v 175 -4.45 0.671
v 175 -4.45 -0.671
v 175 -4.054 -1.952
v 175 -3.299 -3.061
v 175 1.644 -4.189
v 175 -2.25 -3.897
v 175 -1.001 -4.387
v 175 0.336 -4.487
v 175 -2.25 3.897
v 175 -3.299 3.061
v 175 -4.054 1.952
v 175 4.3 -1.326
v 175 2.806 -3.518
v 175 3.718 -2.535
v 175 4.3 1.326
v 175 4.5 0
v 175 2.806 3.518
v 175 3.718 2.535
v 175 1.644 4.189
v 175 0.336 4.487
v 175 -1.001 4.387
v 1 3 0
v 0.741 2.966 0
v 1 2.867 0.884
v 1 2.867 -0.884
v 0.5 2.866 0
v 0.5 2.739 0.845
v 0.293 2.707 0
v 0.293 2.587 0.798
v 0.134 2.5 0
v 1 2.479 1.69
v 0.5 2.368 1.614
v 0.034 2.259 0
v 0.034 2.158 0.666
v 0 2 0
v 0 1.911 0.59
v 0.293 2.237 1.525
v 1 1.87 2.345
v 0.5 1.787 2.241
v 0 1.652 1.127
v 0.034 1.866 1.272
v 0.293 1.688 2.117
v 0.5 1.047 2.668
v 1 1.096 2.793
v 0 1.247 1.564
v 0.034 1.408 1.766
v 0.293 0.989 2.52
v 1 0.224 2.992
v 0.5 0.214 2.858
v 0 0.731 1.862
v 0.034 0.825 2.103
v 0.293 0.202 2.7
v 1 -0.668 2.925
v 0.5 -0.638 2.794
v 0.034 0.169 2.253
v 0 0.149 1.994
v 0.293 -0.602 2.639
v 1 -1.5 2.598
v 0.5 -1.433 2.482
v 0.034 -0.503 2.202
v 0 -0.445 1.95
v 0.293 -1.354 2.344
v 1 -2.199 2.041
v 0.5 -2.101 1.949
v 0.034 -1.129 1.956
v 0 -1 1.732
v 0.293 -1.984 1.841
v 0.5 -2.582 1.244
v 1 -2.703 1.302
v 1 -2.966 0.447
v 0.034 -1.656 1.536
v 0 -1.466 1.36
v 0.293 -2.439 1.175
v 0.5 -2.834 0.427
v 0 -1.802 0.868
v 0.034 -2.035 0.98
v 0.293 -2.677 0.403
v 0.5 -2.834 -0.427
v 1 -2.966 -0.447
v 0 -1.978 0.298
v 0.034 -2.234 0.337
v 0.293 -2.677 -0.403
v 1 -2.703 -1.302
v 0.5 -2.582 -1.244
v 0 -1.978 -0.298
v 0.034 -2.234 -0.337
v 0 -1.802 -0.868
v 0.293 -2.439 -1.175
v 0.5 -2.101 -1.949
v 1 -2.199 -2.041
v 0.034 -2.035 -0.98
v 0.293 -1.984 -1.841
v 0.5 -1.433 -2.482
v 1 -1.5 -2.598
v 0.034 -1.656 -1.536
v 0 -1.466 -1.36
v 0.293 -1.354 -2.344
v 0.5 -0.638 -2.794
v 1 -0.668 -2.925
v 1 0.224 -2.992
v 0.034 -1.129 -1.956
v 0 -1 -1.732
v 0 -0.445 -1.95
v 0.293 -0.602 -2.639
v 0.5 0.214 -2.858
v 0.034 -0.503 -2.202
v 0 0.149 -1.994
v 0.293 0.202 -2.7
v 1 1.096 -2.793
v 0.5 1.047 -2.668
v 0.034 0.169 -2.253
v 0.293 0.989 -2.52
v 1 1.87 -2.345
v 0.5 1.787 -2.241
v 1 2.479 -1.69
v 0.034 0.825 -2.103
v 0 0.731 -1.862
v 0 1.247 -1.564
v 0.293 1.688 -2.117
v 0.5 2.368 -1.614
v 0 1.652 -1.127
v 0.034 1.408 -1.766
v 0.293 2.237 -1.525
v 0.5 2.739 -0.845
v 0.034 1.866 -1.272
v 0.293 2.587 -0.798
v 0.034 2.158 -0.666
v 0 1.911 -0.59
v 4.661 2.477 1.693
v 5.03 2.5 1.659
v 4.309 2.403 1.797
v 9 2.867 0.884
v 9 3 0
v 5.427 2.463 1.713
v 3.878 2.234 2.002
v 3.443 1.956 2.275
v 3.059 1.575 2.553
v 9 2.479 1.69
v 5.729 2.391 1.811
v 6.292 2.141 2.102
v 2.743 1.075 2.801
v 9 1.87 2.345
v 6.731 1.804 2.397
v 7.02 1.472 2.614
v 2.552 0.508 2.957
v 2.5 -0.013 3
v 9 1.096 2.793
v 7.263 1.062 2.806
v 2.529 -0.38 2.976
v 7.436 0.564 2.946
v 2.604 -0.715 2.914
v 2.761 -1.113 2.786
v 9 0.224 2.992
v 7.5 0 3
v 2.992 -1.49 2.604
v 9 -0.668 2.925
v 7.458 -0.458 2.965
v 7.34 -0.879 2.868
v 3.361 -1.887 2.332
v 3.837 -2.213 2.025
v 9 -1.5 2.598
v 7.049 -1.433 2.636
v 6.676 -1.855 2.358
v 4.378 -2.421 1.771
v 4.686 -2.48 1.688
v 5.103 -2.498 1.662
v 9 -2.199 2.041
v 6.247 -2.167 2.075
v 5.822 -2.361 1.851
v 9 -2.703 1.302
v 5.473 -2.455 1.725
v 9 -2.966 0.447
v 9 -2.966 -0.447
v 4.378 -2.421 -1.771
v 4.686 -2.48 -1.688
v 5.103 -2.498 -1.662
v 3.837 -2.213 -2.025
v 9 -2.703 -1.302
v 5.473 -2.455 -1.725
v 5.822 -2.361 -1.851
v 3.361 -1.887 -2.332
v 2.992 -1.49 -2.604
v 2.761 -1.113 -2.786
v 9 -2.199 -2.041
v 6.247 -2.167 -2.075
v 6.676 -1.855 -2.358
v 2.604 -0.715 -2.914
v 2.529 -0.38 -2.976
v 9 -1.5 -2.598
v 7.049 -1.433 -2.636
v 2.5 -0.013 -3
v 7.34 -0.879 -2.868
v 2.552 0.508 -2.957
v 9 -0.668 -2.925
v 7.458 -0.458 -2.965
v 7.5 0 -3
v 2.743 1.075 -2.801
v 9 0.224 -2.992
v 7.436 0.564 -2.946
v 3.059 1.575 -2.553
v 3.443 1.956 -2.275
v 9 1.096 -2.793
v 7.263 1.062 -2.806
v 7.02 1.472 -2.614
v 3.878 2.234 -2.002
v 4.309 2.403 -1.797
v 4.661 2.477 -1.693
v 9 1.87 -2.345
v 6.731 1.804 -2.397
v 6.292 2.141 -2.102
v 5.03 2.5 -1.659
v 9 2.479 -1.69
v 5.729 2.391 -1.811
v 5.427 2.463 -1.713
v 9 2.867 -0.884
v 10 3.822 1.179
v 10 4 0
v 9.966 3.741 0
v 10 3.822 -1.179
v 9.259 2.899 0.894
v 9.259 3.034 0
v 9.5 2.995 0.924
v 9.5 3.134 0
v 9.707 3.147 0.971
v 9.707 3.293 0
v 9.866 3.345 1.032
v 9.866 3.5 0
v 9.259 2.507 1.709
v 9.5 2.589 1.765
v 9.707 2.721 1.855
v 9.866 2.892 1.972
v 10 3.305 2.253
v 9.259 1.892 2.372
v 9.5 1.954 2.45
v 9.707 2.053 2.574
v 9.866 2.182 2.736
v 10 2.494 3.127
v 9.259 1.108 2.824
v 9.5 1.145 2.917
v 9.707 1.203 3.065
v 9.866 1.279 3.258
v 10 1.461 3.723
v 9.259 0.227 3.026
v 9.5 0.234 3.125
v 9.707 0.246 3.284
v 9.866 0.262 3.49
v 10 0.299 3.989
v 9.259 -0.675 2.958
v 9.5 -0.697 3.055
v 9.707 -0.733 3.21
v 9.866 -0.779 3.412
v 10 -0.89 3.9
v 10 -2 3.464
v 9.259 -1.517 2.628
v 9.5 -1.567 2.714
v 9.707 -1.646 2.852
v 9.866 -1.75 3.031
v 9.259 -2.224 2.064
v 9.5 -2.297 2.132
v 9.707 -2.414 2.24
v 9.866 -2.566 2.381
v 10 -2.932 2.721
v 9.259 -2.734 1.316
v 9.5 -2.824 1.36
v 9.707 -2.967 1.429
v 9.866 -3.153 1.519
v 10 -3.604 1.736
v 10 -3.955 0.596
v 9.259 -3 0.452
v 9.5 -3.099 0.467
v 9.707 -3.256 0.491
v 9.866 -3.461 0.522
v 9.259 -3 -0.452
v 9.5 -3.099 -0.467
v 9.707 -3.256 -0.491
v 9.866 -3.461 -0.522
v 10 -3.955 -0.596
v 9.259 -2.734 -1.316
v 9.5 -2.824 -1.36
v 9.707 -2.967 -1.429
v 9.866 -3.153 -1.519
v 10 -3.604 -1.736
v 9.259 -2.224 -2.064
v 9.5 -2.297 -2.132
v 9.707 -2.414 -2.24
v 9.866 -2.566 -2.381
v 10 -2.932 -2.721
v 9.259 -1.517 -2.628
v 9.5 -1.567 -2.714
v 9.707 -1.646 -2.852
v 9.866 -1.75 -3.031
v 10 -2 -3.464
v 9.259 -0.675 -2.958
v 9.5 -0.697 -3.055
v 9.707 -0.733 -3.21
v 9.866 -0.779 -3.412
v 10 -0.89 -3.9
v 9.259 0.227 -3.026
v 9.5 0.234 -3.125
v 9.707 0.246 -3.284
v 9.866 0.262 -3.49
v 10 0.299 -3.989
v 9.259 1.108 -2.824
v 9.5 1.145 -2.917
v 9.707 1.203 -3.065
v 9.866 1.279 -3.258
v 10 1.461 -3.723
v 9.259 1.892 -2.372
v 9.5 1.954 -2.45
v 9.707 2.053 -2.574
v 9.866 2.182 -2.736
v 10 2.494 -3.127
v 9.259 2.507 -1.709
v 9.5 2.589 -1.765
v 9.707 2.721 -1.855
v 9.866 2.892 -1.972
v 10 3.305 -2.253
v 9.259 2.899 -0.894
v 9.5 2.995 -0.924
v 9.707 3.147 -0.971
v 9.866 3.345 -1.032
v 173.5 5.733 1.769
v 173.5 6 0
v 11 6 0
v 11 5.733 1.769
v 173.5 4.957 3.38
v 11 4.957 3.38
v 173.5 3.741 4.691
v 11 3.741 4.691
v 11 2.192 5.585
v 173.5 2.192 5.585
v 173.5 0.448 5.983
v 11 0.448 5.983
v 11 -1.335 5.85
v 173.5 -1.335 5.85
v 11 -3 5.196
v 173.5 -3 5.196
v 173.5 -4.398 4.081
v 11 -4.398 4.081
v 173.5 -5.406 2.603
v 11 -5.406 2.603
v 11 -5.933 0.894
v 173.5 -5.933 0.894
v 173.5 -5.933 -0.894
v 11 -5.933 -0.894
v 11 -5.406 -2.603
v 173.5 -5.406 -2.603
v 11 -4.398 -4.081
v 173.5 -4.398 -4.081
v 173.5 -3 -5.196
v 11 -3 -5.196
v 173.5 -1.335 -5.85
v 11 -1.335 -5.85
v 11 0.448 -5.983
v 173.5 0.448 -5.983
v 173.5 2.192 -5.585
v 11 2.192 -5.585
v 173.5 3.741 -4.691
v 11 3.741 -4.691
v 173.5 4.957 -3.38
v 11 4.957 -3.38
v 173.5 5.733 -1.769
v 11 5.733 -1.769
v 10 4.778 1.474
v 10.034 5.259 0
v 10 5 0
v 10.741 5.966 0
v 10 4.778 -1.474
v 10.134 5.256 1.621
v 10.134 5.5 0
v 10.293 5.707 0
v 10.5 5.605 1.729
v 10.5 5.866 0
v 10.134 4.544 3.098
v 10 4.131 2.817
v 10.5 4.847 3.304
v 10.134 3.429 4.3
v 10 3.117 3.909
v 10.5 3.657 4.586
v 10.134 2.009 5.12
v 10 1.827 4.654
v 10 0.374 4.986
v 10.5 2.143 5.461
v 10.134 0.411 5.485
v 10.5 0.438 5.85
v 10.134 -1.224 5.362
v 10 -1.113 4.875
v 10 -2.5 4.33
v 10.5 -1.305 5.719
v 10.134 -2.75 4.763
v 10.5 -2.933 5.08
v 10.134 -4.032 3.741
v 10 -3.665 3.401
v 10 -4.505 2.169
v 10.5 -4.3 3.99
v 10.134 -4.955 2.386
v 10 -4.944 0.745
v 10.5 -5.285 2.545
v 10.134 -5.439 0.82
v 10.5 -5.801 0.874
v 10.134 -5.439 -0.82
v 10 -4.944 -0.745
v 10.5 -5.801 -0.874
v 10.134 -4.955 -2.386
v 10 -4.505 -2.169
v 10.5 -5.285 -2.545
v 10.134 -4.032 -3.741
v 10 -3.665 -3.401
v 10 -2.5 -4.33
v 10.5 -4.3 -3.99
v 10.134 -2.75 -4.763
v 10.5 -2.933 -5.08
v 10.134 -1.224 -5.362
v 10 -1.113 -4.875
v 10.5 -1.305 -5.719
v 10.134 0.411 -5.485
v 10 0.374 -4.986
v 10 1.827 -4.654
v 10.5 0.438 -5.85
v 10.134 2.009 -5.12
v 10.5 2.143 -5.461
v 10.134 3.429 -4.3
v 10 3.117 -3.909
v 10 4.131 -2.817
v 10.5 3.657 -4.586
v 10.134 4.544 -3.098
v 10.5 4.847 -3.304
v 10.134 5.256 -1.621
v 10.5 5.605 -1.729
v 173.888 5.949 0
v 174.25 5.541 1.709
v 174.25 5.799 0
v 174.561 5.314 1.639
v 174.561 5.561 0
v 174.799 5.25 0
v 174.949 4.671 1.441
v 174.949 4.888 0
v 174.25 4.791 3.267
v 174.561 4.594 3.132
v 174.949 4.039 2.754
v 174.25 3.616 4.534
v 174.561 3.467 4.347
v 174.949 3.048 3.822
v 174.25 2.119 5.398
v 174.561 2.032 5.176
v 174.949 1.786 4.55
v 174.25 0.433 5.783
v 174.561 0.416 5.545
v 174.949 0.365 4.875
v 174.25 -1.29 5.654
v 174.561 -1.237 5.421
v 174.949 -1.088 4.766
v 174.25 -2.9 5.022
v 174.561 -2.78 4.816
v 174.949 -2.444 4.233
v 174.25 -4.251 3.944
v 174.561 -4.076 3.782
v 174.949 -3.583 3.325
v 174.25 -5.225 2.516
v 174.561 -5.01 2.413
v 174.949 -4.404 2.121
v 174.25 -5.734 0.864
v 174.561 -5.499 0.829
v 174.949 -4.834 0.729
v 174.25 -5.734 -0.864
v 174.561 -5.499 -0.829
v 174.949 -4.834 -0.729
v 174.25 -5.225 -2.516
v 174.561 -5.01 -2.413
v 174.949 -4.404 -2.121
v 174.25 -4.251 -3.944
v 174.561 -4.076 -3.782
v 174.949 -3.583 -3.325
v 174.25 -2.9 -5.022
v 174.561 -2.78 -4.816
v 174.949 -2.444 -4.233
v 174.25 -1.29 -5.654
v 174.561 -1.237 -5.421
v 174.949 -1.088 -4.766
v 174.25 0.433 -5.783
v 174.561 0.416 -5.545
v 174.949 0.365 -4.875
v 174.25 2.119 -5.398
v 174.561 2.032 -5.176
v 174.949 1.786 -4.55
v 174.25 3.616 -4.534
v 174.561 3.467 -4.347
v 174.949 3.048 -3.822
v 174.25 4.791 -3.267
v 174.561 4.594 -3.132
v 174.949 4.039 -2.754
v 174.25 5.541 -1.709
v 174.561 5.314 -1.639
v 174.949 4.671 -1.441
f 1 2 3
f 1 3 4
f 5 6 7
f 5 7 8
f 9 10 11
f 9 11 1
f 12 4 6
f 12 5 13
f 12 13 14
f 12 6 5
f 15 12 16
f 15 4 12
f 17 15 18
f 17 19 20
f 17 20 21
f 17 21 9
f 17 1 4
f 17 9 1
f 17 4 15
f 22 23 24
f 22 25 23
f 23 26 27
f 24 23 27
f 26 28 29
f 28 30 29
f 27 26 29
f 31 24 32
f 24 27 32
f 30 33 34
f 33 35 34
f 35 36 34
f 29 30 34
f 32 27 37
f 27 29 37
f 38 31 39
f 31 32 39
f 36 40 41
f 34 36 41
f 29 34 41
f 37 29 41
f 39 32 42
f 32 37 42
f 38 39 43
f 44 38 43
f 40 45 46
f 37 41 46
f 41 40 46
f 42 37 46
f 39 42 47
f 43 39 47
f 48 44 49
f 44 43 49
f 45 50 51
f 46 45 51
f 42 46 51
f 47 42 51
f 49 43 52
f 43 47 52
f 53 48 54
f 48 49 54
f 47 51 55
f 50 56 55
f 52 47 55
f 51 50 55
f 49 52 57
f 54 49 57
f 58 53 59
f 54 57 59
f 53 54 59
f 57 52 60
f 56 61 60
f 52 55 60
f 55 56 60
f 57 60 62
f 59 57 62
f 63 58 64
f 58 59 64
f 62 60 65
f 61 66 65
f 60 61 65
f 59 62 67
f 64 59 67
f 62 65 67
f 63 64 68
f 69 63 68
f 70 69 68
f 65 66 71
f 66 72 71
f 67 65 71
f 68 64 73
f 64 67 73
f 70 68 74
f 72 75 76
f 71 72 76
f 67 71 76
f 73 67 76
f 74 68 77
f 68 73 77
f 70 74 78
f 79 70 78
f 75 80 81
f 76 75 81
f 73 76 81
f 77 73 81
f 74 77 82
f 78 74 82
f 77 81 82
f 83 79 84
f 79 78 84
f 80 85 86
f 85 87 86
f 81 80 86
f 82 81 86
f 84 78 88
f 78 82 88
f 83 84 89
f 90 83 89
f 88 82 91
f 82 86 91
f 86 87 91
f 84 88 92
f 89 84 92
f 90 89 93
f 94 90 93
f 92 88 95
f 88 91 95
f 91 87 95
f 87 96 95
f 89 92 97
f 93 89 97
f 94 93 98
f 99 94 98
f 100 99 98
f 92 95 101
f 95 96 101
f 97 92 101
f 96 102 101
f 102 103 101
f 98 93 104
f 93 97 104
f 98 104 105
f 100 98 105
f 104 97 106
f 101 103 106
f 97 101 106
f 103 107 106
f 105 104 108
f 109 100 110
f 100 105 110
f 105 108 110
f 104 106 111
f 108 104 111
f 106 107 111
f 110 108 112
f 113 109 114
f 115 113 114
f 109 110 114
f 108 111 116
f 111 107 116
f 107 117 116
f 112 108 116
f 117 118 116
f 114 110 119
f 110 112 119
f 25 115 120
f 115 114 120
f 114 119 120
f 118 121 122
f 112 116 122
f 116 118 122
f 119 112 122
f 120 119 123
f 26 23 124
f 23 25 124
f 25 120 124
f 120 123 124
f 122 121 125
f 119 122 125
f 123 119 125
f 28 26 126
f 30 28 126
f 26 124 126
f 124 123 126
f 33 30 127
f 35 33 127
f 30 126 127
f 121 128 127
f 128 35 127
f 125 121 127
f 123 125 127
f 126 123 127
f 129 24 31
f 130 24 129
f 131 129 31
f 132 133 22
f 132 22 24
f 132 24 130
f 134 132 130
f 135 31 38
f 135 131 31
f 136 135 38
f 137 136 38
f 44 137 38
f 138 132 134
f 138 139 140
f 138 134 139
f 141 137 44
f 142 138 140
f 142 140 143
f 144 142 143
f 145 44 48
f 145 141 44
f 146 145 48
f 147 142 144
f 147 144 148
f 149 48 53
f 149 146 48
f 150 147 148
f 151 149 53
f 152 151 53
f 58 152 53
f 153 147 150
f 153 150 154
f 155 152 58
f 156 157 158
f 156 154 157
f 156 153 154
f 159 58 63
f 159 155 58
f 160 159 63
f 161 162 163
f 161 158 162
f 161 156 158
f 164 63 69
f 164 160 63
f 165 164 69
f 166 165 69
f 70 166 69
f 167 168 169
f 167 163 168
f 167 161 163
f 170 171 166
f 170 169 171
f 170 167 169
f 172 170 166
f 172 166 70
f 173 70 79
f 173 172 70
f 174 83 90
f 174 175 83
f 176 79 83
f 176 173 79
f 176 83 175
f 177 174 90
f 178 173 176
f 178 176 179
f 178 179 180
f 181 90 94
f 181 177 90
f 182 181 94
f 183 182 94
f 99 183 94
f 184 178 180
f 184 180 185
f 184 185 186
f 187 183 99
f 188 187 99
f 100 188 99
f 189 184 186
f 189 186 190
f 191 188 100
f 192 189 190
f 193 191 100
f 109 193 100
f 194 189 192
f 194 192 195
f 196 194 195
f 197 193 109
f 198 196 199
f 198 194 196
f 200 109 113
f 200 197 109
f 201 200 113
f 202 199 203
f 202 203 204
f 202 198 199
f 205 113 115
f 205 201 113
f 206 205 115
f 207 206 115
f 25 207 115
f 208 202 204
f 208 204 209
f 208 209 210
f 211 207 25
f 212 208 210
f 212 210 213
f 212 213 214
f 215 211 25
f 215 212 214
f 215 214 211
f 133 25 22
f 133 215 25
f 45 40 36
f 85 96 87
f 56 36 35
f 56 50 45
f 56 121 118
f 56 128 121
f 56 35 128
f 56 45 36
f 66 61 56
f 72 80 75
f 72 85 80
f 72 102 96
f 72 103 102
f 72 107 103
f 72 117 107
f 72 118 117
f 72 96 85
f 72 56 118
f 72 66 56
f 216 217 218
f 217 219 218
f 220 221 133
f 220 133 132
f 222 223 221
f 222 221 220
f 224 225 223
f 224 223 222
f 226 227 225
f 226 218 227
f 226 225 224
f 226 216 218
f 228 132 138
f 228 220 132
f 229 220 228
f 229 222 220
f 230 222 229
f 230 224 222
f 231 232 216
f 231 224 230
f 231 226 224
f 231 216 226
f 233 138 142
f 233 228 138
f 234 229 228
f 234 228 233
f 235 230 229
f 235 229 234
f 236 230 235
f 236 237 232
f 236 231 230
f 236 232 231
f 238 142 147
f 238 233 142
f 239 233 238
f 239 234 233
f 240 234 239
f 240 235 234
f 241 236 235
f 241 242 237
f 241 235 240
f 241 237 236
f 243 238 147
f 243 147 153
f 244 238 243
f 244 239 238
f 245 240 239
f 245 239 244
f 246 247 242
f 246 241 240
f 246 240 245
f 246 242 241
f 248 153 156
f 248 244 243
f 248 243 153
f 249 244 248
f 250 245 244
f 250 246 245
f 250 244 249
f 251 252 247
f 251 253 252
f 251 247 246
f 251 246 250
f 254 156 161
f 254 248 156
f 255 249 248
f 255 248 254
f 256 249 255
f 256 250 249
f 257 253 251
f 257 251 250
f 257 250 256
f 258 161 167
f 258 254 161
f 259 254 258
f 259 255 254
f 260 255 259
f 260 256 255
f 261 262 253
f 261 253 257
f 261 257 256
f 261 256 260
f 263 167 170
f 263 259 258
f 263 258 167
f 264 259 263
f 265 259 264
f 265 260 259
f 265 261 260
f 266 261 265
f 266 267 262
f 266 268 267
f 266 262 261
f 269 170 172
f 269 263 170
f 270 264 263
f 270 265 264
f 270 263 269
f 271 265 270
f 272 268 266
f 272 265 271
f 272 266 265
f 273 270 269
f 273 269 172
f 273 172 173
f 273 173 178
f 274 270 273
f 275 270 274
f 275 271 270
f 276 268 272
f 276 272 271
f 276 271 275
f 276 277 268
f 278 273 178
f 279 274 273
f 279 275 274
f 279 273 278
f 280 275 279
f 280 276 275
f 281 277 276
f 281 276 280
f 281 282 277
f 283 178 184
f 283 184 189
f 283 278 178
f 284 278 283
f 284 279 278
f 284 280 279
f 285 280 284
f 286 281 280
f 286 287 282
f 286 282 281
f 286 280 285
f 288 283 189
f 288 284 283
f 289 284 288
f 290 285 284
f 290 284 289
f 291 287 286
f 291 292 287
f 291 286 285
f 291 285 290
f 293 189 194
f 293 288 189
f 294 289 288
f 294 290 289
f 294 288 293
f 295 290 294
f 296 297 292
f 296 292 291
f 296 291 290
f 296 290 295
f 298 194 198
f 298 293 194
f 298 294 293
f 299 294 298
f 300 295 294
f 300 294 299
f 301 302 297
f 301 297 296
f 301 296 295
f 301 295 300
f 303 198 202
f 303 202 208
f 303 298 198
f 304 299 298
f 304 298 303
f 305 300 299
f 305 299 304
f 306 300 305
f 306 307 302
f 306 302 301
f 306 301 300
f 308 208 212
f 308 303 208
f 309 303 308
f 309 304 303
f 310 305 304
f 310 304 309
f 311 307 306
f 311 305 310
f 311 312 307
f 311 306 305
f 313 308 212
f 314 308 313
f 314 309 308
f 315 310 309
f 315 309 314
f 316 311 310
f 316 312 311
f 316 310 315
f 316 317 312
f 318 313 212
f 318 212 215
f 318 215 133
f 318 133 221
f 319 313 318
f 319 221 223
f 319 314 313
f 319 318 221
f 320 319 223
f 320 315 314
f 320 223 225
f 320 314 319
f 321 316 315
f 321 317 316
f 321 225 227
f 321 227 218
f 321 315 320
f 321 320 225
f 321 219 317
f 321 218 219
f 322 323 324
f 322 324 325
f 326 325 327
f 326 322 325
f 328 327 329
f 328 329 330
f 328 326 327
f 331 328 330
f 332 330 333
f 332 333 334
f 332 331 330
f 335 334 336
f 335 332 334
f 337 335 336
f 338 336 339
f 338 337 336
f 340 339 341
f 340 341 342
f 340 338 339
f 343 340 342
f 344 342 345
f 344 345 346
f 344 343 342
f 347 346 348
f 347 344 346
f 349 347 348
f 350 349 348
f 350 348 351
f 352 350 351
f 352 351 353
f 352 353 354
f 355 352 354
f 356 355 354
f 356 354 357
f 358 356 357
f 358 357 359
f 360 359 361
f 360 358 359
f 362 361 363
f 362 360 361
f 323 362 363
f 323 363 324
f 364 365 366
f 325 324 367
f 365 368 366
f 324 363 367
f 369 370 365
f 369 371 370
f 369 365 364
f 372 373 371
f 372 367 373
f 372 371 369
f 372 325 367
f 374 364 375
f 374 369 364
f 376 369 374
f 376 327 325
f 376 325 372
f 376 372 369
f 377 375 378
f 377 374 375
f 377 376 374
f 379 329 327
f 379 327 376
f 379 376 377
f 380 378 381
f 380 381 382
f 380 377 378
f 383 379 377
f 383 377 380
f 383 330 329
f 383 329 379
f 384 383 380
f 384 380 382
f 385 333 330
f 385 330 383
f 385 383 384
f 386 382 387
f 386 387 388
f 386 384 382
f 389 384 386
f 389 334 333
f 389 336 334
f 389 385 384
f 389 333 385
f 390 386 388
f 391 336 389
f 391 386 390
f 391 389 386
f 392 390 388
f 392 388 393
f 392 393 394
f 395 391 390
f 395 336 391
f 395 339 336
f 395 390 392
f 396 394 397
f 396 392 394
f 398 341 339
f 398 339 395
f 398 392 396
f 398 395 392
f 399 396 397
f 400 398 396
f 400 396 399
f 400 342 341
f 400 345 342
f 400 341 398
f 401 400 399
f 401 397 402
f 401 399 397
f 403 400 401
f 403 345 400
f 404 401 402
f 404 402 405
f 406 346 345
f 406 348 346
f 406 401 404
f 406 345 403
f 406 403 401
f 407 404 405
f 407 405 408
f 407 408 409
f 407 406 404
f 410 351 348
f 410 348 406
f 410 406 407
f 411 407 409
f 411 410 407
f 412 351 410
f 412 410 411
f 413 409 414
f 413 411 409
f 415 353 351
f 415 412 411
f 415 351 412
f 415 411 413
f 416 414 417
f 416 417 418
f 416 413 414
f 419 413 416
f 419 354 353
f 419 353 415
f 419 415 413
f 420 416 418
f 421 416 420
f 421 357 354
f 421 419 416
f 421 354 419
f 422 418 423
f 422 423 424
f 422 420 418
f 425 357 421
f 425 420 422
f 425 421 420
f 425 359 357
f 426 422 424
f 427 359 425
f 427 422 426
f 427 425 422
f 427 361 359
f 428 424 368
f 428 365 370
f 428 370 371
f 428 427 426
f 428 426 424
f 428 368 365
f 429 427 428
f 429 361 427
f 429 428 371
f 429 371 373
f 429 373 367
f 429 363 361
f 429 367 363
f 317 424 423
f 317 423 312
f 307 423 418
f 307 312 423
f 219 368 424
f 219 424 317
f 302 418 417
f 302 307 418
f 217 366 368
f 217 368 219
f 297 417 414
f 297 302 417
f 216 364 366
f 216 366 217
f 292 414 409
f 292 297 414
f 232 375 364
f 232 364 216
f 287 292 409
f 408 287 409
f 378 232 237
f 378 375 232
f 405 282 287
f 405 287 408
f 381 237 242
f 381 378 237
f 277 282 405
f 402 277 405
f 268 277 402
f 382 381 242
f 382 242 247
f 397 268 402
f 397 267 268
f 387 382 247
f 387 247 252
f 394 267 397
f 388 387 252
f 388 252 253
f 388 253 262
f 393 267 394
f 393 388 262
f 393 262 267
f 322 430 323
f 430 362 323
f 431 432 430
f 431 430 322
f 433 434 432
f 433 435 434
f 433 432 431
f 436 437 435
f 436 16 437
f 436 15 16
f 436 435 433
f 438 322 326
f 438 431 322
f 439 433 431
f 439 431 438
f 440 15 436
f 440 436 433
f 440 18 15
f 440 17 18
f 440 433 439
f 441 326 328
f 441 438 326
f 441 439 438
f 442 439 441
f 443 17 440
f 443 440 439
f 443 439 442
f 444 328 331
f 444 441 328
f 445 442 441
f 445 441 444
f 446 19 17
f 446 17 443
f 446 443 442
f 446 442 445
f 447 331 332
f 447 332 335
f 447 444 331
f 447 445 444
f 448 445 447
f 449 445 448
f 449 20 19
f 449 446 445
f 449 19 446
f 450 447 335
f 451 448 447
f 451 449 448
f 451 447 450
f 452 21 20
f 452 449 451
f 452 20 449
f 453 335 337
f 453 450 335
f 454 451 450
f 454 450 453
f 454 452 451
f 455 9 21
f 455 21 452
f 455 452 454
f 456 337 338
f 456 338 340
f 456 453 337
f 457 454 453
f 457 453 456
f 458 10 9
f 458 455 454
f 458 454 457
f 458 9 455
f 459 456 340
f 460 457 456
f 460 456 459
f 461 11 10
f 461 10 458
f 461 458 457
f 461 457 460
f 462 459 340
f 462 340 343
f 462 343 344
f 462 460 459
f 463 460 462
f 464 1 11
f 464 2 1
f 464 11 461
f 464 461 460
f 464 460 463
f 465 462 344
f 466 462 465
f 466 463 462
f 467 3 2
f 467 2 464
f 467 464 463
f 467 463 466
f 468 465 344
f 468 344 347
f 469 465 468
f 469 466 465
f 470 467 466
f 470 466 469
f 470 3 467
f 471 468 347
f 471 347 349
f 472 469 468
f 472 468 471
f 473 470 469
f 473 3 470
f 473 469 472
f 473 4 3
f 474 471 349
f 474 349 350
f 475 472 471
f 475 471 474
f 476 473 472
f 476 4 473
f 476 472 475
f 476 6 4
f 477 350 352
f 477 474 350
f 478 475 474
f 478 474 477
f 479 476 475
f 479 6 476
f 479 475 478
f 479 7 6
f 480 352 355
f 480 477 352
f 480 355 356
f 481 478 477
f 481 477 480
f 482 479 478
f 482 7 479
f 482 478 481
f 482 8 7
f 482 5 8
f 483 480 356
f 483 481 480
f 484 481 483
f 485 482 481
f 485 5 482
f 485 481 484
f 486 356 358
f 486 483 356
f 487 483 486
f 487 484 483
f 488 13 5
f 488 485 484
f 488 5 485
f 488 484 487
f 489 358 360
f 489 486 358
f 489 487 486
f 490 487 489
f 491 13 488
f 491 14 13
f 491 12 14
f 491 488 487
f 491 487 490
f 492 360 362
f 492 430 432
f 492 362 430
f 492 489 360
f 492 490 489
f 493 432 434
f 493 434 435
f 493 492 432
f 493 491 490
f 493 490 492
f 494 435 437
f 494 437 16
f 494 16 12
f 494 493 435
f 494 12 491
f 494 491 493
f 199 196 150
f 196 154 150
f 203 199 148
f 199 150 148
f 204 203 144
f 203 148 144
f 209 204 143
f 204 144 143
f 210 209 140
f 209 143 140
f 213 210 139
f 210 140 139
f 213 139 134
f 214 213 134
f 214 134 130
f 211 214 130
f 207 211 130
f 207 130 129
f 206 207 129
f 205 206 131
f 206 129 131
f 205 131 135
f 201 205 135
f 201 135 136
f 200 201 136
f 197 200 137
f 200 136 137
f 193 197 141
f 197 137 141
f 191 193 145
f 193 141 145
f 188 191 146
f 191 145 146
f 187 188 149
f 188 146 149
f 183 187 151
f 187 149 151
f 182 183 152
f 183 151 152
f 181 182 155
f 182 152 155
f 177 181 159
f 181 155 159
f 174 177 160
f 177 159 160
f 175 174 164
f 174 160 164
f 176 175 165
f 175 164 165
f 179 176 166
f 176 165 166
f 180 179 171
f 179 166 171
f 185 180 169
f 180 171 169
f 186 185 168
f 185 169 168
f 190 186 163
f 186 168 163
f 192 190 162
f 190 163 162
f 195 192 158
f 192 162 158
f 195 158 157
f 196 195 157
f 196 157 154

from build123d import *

# Parameters (mm, degrees)
SKETCH2_R               = 2.5
CUT_EXTRUDE1_DEPTH      = 7
CUT_EXTRUDE1_DEPTH_BACK = 7
FILLET2_R               = 1
FILLET3_R               = 1
FILLET4_R               = 1.5


with BuildPart() as part:
    # Sketch1 → Revolve1 (revolve)
    with BuildSketch(Plane.XY):
        Polygon((0, 3), (10, 3), (10, 6), (175, 6), (175, 0), (0, 0), align=None)
    revolve(axis=Axis((0, 0, 0), (1, 0, 0)))

    # Sketch2 → Cut-Extrude1 (cut, two sides)
    with BuildSketch(Plane.XY) as cut_extrude1_sk:
        with Locations((5, 0)):
            Circle(SKETCH2_R)
    extrude(amount=CUT_EXTRUDE1_DEPTH, mode=Mode.SUBTRACT)
    extrude(cut_extrude1_sk.sketch, amount=-CUT_EXTRUDE1_DEPTH_BACK, mode=Mode.SUBTRACT)

    # Fillet2
    fillet2_edges = [part.edges().sort_by_distance(p)[0] for p in [
        (0, -3, 0),
    ]]
    fillet(fillet2_edges, radius=FILLET2_R)

    # Fillet3
    fillet3_edges = [part.edges().sort_by_distance(p)[0] for p in [
        (10, -6, 0),
        (10, -3, 0),
    ]]
    fillet(fillet3_edges, radius=FILLET3_R)

    # Fillet4
    fillet4_edges = [part.edges().sort_by_distance(p)[0] for p in [
        (175, -6, 0),
    ]]
    fillet(fillet4_edges, radius=FILLET4_R)


solid = part.part
